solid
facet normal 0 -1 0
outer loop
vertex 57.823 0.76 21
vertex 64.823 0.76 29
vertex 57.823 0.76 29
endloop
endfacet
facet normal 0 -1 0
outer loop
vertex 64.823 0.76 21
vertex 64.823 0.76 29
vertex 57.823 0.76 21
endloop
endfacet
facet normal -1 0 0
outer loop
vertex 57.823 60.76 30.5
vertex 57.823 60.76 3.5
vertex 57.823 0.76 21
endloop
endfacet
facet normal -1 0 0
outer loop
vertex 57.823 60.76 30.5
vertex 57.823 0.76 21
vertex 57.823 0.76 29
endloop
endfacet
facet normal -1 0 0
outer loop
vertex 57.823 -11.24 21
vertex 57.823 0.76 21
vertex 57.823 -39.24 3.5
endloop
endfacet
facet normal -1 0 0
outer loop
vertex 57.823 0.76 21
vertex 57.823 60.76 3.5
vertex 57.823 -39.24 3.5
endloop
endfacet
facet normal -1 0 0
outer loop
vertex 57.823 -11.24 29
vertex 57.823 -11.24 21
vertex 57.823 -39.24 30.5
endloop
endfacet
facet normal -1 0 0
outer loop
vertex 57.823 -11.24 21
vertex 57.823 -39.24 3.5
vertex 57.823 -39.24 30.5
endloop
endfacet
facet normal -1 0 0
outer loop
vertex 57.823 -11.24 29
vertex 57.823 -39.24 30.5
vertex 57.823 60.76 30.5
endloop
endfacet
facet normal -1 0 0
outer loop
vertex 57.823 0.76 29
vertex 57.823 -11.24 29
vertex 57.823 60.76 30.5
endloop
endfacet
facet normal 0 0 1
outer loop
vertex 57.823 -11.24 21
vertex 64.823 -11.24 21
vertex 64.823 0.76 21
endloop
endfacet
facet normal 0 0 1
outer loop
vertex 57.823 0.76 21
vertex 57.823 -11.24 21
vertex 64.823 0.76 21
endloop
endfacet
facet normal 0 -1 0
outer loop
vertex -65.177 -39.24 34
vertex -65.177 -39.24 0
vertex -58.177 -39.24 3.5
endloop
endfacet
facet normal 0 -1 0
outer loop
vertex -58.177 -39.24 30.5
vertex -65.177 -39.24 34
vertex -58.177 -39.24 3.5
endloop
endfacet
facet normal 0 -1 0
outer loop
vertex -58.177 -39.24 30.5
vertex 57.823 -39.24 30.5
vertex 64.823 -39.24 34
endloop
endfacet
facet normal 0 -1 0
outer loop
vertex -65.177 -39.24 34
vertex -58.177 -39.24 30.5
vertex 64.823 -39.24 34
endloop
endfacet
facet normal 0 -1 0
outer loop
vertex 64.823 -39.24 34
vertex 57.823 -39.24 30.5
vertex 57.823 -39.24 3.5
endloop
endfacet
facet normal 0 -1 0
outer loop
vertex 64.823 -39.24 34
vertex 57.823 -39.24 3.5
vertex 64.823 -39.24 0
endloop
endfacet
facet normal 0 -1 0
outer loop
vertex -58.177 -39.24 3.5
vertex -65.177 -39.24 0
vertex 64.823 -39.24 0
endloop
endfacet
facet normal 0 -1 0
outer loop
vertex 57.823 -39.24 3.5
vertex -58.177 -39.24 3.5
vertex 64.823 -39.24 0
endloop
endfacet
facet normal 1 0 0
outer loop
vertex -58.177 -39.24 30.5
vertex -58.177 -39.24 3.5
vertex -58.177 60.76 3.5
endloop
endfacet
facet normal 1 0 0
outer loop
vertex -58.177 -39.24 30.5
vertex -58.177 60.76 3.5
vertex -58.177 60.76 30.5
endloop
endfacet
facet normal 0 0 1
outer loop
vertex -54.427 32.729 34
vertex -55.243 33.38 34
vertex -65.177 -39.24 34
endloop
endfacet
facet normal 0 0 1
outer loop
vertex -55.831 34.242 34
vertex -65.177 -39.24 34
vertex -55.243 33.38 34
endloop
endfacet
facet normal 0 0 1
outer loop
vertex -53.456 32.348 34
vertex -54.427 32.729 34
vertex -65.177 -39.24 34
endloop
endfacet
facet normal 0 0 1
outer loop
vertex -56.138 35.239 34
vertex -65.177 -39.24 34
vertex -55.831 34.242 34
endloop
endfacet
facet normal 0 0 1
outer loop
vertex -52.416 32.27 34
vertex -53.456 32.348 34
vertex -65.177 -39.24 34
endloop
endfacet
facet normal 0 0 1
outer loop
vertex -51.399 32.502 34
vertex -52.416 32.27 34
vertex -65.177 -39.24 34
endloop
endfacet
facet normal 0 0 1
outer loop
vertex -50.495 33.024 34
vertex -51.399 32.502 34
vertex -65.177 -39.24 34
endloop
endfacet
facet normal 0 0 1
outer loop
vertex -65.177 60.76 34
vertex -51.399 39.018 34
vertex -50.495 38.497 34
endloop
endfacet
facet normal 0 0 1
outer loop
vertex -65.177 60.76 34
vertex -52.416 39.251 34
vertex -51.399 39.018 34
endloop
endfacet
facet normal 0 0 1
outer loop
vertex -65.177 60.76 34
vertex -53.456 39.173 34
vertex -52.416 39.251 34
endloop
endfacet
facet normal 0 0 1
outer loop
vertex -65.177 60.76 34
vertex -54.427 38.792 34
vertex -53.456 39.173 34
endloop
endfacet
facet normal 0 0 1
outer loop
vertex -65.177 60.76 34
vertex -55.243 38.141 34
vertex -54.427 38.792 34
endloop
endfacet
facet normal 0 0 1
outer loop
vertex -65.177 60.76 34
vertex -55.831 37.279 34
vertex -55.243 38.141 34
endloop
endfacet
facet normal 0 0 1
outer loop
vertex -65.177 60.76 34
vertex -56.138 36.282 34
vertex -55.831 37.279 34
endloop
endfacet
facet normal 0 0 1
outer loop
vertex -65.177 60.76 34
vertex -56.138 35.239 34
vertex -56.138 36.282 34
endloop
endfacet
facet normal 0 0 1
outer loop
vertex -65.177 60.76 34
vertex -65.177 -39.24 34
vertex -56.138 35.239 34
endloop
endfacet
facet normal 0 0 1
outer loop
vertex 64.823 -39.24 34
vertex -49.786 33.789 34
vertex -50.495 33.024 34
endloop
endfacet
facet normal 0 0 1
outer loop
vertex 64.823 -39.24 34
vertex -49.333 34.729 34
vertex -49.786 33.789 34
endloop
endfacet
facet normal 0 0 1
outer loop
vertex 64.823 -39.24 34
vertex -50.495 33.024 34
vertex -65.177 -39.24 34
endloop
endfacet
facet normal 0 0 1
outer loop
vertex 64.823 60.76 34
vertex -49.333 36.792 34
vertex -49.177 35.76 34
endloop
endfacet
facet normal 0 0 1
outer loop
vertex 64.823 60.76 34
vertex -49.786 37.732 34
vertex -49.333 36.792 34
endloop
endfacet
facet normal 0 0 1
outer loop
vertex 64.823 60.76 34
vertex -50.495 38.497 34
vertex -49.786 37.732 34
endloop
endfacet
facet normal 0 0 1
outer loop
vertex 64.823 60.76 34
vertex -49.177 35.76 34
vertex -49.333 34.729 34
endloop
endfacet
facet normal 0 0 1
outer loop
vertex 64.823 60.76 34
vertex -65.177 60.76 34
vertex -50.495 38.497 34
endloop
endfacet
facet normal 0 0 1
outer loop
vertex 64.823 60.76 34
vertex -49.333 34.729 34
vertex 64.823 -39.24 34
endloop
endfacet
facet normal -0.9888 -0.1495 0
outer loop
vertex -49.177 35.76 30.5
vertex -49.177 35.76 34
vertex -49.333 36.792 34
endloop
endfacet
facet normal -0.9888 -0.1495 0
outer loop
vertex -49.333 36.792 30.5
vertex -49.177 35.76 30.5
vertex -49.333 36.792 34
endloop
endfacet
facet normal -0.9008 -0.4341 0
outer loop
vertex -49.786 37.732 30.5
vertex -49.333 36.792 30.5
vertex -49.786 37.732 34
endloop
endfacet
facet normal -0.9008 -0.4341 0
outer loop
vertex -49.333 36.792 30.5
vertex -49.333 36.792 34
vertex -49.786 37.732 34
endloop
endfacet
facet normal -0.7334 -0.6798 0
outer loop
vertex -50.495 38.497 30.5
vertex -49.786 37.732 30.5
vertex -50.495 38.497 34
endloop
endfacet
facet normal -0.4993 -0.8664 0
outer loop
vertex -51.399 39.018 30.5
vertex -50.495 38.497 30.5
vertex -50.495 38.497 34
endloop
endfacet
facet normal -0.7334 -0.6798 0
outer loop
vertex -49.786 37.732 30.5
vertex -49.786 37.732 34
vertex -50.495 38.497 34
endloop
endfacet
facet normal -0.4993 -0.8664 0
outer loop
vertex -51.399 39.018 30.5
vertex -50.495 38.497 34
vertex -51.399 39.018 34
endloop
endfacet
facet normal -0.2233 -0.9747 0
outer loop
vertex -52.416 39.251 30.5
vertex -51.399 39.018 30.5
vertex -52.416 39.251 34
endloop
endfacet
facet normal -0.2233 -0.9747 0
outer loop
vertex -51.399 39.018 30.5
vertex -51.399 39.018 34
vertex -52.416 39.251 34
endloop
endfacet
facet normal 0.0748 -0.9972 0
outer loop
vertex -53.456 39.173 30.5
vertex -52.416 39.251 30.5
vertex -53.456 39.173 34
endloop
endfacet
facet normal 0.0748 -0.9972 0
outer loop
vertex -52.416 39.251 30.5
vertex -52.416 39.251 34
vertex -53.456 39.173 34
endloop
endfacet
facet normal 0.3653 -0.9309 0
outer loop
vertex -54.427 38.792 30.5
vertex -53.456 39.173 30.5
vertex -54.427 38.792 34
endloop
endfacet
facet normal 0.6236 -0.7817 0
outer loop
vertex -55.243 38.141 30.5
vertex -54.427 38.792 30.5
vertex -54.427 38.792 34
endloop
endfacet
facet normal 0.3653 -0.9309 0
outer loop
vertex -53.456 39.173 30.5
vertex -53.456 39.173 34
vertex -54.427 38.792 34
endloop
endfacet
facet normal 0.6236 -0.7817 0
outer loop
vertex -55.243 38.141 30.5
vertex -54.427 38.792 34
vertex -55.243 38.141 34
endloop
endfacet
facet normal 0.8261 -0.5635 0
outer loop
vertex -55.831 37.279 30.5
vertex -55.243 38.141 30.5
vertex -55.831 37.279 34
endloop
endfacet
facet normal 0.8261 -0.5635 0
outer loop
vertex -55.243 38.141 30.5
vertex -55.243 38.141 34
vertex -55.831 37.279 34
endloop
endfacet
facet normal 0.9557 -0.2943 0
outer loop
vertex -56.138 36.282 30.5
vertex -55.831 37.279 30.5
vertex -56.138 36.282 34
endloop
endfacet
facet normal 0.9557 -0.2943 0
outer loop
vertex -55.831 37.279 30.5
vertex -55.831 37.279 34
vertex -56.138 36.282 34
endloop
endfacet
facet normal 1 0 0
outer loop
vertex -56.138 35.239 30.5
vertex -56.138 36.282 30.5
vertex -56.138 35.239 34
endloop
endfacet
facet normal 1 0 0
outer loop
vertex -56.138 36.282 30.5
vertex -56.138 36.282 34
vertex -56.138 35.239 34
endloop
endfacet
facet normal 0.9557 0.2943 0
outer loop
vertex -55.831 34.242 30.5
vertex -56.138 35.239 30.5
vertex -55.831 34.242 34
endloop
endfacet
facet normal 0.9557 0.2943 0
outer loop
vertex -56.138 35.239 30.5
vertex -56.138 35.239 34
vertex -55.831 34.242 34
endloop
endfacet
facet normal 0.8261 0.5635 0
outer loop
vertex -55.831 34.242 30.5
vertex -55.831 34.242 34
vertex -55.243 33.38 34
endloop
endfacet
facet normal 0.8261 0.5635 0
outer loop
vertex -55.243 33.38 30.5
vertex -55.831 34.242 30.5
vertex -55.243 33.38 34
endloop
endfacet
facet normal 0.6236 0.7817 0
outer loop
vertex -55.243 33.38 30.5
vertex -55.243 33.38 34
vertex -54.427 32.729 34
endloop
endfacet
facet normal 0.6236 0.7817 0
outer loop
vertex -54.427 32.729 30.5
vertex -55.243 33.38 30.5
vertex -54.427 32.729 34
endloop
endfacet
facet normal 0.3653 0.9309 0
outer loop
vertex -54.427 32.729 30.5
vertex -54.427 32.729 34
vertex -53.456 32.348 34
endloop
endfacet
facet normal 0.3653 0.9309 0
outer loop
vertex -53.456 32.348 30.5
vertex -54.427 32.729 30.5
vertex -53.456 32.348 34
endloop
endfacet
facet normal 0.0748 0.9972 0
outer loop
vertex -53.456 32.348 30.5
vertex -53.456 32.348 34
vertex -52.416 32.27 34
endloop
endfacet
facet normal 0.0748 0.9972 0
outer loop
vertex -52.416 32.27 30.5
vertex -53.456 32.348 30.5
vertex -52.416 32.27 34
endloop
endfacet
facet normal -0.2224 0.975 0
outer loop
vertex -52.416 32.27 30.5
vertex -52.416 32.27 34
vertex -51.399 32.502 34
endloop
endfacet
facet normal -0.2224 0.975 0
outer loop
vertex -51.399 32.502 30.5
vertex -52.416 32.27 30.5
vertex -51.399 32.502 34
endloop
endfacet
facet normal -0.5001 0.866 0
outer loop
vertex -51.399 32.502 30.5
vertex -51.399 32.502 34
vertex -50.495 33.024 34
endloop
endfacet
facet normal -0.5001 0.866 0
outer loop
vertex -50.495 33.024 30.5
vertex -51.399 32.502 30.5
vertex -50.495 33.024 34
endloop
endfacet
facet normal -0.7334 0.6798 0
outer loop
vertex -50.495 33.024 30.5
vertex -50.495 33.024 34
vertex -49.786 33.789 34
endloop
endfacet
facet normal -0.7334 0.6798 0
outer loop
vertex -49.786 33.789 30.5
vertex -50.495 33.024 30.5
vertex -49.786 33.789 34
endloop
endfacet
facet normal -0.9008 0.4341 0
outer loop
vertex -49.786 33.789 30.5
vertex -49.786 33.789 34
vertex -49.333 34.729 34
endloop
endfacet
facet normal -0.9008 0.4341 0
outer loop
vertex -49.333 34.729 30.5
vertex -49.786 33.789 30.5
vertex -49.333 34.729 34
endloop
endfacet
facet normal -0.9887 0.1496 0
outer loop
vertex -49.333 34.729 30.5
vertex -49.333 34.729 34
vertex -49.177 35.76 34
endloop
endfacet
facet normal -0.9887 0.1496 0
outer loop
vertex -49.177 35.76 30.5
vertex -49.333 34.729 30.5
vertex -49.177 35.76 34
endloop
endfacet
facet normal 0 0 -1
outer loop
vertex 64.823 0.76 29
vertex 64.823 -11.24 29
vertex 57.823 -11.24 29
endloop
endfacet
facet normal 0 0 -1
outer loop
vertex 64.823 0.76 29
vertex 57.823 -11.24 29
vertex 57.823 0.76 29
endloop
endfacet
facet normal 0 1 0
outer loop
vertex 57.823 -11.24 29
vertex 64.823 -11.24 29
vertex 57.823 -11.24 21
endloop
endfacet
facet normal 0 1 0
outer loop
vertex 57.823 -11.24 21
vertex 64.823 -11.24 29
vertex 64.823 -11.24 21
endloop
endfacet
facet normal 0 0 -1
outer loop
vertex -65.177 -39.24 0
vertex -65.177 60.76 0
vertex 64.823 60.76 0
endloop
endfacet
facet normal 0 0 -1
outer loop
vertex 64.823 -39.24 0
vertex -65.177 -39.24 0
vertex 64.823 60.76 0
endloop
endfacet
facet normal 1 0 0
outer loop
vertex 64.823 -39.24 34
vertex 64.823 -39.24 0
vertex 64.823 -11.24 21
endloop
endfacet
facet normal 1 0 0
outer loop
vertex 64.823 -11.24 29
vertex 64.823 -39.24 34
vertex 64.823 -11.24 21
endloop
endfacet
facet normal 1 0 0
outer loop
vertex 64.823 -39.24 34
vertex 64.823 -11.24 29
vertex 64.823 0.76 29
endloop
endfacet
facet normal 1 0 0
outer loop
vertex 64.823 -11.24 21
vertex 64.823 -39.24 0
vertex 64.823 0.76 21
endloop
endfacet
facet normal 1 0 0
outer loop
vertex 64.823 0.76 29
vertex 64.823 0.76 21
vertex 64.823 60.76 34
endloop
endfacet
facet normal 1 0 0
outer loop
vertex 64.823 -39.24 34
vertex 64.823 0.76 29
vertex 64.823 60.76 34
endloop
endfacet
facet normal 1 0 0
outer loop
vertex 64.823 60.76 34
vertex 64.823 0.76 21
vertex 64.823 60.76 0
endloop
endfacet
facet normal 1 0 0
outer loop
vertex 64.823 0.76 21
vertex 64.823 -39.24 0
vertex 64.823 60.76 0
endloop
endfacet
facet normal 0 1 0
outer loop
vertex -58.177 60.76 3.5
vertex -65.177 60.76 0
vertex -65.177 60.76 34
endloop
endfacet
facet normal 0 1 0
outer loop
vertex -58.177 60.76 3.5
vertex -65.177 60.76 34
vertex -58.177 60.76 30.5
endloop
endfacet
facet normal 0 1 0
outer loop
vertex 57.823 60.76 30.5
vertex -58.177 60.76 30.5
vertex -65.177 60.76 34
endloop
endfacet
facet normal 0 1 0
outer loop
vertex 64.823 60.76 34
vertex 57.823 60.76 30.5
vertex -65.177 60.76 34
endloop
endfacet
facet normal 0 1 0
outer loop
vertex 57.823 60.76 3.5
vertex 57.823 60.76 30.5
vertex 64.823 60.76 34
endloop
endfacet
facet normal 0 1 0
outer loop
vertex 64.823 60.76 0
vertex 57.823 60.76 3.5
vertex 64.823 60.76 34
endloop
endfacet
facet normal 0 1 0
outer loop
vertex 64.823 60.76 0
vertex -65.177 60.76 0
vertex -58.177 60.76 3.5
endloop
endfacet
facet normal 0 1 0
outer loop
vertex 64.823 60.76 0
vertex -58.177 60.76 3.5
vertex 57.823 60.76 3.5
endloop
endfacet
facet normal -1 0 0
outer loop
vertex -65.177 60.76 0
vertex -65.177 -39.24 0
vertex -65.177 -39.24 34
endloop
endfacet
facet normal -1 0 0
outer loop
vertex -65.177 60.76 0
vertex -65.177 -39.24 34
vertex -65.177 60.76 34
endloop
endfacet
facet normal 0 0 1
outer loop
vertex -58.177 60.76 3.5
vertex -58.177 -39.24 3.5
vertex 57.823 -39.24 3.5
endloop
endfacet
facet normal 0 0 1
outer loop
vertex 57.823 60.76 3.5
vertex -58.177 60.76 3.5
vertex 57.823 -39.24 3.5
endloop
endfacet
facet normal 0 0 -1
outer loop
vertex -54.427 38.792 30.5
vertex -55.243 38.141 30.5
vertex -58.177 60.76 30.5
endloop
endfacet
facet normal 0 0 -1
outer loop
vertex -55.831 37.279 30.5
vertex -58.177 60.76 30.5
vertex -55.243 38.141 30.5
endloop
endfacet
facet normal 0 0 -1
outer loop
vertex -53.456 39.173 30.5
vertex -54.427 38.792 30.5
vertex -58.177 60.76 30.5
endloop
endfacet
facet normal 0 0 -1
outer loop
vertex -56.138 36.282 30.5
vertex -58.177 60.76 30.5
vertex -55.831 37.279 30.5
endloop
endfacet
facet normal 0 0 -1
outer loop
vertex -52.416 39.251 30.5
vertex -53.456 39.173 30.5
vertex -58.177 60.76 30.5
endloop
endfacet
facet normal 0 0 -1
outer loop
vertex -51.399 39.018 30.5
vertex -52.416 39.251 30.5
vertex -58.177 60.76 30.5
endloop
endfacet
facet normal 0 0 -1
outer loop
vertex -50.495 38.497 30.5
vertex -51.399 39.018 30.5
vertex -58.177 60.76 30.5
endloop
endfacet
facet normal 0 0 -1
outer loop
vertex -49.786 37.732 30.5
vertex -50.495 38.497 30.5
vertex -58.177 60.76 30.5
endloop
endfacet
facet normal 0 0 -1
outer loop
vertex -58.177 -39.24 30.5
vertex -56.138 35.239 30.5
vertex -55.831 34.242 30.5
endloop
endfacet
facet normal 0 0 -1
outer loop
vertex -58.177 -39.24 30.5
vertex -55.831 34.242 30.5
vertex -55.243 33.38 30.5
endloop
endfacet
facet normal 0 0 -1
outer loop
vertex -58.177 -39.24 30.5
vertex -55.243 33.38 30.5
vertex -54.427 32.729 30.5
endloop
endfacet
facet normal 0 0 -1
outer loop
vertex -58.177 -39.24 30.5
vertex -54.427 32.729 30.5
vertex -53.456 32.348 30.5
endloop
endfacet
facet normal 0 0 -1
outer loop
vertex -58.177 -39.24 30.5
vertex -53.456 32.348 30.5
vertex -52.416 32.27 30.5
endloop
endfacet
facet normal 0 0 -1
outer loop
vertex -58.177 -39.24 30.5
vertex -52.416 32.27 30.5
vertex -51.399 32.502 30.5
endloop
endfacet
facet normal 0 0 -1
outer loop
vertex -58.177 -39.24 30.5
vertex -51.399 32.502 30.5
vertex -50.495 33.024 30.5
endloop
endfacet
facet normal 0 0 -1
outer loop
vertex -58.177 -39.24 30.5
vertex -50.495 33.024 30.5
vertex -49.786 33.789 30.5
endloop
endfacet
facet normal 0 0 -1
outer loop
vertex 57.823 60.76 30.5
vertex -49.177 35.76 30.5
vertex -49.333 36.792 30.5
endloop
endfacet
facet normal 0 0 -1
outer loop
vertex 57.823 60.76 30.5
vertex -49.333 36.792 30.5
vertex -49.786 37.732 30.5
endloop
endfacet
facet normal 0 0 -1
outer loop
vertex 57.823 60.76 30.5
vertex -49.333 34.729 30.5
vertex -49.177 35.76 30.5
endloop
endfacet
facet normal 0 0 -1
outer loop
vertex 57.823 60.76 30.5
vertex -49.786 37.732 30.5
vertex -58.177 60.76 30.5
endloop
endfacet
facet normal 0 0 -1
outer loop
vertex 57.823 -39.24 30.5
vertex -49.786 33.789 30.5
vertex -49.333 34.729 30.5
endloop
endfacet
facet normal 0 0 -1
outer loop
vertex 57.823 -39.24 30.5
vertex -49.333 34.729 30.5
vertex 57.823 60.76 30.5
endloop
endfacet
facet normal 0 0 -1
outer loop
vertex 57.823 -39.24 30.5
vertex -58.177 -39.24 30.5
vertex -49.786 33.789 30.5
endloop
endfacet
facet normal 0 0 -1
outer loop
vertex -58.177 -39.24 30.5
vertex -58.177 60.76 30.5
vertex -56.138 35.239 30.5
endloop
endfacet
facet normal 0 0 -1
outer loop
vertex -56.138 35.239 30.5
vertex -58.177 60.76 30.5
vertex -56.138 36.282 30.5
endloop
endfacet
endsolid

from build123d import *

# Parameters (mm, degrees)
ESQUISSE1_W             = 130
ESQUISSE1_H             = 100
BOSS_EXTRU_1_DEPTH      = 34
ESQUISSE2_W             = 116
ESQUISSE2_H             = 27
ENL_V_MAT_EXTRU_1_DEPTH = 106
ESQUISSE3_R             = 3.5
ENL_V_MAT_EXTRU_2_DEPTH = 10
ESQUISSE4_W             = 8
ESQUISSE4_H             = 12
ENL_V_MAT_EXTRU_3_DEPTH = 10


with BuildPart() as part:
    # Esquisse1 → Boss.-Extru.1 (new body)
    with BuildSketch(Plane.XY):
        with Locations((-0.177352831, 10.760428886)):
            Rectangle(ESQUISSE1_W, ESQUISSE1_H)
    extrude(amount=BOSS_EXTRU_1_DEPTH)

    # Esquisse2 → Enlèv. mat.-Extru.1 (cut)
    with BuildSketch(Plane.XZ.offset(39.239571114)):
        with Locations((-0.177352831, 17)):
            Rectangle(ESQUISSE2_W, ESQUISSE2_H)
    extrude(amount=-ENL_V_MAT_EXTRU_1_DEPTH, mode=Mode.SUBTRACT)

    # Esquisse3 → Enlèv. mat.-Extru.2 (cut)
    with BuildSketch(Plane.XY.offset(34)):
        with Locations((-52.677352831, 35.760428886)):
            Circle(ESQUISSE3_R)
    extrude(amount=-ENL_V_MAT_EXTRU_2_DEPTH, mode=Mode.SUBTRACT)

    # Esquisse4 → Enlèv. mat.-Extru.3 (cut)
    with BuildSketch(Plane(origin=(64.822647169, 0, 0), x_dir=(0, 0, -1), z_dir=(1, 0, 0))):
        with Locations((-25, -5.239571114)):
            Rectangle(ESQUISSE4_W, ESQUISSE4_H)
    extrude(amount=-ENL_V_MAT_EXTRU_3_DEPTH, mode=Mode.SUBTRACT)


solid = part.part
